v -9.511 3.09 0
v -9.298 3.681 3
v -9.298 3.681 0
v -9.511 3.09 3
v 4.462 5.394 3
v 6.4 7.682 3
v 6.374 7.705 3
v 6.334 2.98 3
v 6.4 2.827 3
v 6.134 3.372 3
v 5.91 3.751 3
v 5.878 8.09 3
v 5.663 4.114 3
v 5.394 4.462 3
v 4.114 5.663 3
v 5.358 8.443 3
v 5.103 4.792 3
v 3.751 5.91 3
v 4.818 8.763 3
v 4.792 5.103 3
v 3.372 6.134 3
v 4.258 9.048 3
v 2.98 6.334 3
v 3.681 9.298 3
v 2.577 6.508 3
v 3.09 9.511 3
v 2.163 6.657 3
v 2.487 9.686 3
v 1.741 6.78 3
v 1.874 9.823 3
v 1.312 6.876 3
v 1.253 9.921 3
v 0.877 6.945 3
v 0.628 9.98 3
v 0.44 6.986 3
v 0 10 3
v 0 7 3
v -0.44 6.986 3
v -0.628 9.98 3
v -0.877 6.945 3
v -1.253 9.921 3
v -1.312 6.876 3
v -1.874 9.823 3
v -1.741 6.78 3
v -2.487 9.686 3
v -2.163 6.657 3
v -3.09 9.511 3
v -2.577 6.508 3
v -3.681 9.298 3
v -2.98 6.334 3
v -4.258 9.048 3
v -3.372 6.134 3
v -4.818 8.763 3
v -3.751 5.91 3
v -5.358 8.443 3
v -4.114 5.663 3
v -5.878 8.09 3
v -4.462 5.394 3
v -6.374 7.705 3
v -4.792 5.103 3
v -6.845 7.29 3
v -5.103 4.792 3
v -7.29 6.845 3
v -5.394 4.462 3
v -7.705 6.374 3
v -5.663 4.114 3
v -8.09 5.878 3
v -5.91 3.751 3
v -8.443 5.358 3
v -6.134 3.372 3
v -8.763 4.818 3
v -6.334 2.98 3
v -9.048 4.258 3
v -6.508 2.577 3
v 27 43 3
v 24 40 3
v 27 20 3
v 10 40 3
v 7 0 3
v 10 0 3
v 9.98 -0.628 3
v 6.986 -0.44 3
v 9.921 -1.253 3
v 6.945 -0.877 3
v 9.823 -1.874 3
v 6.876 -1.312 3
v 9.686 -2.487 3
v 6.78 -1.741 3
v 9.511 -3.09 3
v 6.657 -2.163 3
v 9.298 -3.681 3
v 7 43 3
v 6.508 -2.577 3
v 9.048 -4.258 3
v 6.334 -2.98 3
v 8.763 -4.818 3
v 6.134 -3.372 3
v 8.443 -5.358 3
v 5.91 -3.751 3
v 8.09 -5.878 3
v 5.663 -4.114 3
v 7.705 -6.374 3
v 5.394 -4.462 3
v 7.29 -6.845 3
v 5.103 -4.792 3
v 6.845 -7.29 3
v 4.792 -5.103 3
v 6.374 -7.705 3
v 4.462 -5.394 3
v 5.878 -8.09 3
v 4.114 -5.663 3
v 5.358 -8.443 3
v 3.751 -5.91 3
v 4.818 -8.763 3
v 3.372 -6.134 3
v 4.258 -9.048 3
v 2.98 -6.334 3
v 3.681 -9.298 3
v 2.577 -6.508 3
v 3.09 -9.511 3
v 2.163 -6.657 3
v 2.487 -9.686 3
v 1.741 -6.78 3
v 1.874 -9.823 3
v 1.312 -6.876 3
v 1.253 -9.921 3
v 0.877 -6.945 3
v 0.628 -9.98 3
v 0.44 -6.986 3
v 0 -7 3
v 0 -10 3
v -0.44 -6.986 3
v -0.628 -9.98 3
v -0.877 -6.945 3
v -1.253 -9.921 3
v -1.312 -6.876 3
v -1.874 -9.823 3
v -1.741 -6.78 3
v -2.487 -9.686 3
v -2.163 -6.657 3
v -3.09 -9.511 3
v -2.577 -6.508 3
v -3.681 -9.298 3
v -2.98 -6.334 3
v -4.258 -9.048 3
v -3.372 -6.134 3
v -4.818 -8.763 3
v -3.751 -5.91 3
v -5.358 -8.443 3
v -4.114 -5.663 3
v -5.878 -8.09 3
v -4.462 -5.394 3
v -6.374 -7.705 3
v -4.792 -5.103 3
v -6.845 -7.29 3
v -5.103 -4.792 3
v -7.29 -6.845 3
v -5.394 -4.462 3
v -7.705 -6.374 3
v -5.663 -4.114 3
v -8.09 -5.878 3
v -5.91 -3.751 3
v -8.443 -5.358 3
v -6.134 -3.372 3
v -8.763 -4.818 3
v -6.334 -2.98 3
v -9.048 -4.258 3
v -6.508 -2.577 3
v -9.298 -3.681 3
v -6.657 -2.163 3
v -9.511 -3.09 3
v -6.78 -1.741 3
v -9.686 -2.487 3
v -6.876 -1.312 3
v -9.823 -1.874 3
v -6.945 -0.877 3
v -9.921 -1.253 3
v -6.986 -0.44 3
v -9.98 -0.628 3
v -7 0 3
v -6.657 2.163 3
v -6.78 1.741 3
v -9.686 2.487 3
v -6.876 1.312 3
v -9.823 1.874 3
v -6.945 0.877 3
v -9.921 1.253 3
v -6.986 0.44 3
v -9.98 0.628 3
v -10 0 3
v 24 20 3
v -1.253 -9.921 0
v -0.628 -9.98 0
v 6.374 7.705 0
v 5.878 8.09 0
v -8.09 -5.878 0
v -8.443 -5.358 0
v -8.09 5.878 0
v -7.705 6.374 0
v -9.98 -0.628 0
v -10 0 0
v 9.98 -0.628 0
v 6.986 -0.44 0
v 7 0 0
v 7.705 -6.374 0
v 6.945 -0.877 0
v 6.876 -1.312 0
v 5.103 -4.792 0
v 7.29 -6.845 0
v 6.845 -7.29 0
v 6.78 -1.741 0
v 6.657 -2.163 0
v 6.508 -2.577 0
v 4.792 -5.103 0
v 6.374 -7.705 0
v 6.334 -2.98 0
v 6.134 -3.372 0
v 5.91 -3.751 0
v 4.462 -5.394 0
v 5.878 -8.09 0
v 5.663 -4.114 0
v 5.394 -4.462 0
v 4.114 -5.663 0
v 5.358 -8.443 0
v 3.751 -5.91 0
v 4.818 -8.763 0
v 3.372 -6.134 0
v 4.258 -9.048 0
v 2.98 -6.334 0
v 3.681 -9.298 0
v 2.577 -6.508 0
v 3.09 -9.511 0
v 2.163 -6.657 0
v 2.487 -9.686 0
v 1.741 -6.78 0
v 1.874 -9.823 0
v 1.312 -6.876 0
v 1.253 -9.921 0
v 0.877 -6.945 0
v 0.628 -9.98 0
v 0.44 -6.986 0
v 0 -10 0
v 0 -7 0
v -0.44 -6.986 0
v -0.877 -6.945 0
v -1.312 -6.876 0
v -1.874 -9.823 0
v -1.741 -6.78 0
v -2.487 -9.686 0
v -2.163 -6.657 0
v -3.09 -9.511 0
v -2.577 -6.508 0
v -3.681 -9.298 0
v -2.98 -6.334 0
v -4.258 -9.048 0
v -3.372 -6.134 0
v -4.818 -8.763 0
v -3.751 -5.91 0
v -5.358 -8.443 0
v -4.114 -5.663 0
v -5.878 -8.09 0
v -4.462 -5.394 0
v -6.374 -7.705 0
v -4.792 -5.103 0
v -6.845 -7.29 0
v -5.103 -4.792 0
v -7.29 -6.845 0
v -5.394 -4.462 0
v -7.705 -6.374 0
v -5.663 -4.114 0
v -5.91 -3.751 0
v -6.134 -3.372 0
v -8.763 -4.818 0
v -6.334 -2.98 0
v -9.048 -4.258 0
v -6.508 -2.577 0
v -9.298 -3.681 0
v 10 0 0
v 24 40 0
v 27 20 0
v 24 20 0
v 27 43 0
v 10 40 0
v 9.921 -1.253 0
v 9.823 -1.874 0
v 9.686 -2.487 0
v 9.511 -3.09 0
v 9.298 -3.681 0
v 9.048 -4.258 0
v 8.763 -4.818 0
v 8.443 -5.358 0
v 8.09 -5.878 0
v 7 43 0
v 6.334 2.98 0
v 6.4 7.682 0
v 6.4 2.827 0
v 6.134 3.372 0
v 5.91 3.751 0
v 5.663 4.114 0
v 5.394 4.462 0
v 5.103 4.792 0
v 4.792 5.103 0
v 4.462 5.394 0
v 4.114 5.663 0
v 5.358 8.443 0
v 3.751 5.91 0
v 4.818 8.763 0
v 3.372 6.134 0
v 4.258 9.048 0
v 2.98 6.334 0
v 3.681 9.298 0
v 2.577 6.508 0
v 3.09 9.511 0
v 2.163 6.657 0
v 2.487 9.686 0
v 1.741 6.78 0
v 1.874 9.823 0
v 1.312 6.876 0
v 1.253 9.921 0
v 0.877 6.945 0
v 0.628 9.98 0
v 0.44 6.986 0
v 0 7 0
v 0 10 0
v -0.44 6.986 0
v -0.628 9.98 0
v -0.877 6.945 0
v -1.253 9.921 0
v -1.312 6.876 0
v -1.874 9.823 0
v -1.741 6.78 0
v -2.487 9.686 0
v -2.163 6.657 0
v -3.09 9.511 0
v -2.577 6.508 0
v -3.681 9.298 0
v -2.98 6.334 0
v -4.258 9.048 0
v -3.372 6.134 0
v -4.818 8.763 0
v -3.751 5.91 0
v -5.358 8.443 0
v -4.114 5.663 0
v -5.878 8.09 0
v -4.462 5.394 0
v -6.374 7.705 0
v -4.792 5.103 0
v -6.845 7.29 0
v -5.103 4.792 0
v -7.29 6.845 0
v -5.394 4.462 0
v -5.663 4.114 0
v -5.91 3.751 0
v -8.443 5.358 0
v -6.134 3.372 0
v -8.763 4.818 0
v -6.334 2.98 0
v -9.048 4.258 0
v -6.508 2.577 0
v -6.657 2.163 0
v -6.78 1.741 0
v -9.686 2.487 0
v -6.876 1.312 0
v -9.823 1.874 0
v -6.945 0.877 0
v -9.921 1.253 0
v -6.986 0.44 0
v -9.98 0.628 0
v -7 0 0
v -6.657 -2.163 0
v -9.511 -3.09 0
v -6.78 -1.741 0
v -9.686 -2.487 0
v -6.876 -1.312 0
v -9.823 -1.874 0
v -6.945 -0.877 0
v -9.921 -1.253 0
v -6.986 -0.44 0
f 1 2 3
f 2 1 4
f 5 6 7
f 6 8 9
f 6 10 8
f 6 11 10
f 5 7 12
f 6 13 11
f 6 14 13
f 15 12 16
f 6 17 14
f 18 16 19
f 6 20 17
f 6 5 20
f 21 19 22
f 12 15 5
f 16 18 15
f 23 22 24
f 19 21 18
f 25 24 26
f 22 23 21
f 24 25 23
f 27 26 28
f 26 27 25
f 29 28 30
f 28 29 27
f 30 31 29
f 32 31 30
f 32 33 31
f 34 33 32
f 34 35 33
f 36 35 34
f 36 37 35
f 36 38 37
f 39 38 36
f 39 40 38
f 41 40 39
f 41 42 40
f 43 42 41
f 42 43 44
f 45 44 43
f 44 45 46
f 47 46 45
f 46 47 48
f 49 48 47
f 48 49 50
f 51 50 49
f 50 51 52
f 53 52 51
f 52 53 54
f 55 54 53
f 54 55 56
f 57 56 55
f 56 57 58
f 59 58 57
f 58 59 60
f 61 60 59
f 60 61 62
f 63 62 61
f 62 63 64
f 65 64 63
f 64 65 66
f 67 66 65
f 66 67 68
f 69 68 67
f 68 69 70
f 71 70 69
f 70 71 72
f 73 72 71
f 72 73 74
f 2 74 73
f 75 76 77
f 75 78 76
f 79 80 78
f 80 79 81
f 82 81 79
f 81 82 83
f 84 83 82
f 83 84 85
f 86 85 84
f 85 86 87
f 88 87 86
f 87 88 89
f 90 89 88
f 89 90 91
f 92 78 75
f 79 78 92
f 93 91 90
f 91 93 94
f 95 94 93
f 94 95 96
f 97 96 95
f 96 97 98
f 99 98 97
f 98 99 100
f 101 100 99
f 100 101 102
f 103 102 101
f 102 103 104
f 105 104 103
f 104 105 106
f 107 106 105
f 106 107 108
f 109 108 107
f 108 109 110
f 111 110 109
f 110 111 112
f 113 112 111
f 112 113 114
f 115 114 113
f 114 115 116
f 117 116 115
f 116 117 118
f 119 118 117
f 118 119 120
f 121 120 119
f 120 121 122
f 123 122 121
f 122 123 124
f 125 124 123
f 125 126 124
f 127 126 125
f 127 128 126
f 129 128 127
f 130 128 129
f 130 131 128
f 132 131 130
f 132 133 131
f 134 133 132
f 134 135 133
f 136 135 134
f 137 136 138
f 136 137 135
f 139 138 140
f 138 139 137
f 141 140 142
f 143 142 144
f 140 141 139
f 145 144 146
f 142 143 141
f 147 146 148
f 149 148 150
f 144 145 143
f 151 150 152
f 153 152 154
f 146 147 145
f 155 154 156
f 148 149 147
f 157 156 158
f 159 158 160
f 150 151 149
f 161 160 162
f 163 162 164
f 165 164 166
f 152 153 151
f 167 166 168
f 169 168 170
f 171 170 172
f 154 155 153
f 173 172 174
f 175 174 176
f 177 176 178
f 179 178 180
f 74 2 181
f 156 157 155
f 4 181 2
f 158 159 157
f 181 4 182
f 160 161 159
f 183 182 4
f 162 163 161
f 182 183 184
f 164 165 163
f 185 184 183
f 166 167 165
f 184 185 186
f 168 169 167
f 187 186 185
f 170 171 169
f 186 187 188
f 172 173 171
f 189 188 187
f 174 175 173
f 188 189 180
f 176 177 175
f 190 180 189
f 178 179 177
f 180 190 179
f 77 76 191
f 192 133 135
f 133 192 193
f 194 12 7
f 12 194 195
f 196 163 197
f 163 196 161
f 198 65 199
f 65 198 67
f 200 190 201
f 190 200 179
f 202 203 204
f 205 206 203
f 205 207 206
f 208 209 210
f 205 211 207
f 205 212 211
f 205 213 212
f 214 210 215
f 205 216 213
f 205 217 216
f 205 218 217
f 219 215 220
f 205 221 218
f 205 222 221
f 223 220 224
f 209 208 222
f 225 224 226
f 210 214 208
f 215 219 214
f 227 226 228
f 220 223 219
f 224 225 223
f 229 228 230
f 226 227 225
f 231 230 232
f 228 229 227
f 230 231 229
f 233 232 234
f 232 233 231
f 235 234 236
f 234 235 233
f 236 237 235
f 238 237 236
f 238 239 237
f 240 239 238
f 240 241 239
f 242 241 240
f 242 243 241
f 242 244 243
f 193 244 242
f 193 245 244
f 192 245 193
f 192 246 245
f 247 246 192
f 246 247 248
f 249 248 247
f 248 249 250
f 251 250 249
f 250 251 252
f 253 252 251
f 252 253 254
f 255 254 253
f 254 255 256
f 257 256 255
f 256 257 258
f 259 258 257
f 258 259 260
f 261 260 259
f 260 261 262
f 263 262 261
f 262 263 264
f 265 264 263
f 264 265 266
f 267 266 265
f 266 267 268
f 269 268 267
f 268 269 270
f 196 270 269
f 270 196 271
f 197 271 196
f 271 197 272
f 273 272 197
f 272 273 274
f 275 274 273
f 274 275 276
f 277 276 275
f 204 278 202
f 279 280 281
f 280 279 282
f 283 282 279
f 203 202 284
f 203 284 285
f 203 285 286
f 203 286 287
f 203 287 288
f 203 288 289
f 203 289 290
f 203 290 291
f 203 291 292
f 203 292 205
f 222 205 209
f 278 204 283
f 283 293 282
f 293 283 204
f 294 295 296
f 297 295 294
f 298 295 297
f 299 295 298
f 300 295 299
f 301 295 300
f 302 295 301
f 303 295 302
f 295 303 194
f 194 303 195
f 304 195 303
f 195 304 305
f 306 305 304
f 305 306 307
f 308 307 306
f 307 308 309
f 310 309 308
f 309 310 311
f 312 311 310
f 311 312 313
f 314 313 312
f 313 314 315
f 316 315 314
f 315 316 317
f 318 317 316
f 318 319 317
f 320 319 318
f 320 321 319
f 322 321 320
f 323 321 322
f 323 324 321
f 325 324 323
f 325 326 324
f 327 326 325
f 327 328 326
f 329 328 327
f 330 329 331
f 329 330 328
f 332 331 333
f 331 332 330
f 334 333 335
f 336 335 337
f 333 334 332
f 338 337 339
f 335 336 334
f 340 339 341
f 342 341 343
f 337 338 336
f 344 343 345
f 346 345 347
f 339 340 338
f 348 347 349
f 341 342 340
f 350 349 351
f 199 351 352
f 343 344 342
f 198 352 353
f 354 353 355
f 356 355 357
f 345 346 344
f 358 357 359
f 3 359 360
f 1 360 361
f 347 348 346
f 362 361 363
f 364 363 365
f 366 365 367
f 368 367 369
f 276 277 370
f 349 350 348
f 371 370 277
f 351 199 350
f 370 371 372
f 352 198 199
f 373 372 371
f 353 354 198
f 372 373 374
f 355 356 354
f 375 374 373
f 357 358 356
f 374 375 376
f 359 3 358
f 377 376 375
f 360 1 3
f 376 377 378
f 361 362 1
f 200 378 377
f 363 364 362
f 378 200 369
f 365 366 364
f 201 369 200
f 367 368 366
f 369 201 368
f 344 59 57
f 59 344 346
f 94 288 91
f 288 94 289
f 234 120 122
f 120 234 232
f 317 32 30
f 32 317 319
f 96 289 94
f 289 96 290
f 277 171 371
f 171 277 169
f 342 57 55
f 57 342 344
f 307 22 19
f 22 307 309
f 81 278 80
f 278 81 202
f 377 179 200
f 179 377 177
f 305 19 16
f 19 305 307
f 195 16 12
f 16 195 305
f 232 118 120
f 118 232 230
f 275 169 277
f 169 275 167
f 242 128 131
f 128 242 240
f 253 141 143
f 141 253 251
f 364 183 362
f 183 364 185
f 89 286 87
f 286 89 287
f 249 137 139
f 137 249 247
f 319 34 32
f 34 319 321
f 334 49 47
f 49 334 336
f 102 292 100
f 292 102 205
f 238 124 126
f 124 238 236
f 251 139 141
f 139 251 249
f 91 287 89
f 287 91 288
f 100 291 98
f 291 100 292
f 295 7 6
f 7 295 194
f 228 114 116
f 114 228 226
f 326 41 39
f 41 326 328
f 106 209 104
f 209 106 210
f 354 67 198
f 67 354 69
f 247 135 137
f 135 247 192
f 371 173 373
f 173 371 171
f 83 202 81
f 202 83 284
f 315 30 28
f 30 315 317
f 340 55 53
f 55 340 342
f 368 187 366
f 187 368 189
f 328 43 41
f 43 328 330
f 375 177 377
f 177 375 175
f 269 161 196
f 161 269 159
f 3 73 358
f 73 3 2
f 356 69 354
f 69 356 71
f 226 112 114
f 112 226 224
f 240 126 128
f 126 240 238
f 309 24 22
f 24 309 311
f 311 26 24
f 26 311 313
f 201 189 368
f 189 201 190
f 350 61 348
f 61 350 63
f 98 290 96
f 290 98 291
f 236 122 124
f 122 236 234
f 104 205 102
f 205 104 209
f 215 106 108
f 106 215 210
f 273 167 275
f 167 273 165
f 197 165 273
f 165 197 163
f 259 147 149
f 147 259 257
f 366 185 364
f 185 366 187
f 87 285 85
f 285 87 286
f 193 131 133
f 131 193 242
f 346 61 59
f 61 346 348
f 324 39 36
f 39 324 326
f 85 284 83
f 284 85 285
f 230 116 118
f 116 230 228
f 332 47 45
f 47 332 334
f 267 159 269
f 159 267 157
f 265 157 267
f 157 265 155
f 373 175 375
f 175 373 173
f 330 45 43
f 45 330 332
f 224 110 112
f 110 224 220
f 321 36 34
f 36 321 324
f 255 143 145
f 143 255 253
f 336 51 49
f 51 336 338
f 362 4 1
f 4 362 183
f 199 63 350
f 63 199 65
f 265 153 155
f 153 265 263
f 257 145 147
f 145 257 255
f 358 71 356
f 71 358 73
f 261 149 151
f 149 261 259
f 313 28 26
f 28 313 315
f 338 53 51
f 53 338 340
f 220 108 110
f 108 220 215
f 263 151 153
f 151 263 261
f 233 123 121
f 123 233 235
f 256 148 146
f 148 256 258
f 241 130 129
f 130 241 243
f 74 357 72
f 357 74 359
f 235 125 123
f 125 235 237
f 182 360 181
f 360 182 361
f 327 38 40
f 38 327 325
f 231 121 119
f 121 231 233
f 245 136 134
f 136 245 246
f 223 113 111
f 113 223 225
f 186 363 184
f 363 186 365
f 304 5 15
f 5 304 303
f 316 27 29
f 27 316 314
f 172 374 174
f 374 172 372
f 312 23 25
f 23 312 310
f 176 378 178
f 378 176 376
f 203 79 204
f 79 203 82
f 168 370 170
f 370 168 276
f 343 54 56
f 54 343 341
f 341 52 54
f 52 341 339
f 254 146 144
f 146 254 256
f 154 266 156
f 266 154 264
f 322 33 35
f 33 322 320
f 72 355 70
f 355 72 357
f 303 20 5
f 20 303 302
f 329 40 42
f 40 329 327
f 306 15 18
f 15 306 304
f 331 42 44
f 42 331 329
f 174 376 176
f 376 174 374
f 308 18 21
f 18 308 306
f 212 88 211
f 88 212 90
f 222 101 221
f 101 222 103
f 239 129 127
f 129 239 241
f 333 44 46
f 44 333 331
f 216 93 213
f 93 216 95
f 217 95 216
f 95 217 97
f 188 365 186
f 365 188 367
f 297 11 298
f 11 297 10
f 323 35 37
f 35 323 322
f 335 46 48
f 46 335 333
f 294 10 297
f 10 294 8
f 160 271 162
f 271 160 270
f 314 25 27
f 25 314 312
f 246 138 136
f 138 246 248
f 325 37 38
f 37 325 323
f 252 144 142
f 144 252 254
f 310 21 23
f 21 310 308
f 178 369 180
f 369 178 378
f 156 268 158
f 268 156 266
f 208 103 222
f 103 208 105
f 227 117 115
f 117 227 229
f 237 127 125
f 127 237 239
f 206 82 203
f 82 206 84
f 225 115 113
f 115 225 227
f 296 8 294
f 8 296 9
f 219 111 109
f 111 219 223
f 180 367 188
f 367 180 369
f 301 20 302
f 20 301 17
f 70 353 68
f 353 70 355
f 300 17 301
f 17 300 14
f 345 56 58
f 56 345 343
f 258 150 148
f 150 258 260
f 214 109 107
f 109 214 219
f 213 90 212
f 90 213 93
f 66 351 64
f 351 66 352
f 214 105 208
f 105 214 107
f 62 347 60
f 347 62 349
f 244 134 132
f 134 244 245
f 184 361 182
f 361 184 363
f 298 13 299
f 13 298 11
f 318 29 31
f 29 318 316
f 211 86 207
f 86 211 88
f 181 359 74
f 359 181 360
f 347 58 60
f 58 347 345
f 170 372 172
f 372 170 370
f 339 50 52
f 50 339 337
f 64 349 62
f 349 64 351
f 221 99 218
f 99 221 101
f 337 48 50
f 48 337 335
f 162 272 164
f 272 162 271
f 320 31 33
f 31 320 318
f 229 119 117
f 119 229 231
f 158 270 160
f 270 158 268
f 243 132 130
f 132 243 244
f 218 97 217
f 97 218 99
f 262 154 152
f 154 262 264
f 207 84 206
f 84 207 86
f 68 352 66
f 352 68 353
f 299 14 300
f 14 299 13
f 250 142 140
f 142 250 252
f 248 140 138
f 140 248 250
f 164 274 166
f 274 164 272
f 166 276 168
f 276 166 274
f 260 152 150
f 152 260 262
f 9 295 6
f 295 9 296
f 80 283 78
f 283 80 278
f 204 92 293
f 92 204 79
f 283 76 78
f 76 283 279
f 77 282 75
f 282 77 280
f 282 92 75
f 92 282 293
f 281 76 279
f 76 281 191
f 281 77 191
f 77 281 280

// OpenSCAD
 /*
 * Actual glass name v.2
 * (c) 2020 David Mikulik
 * Licensed under 
 *   Creative Commons 
 *   Attribution Non Comercial Share alike license
 */
 

THIKNES = 3;

HOOK_DIAMETER = 20;

TEXTPAD_WIDTH = 34;
TEXTPAD_HEIGHT = 20;
TEXTPAD_NAME = "David";
TEXTPAD_IMAGE = "creeperhead.png";
//import(file = "160623.svg ", center = false, dpi = 96);
// 

NAME = 0;
IMAGE= 1;

 hook ();
 $fn=100;
 //translate ([30,0,0])   textPad ();
  
 module hook() {
     difference () {
        cylinder(d= HOOK_DIAMETER, h=THIKNES);
        cylinder(d= HOOK_DIAMETER-THIKNES*2, h=THIKNES);
        translate ([HOOK_DIAMETER/2-THIKNES*1.2,0,0])
            cube ([THIKNES/4, HOOK_DIAMETER/2, THIKNES]);
     }
     translate ([HOOK_DIAMETER/2-THIKNES,0,0])
        cube ([THIKNES, HOOK_DIAMETER*2, THIKNES]);
     translate ([HOOK_DIAMETER/2-THIKNES,HOOK_DIAMETER*2,0])
        cube ([HOOK_DIAMETER,THIKNES, THIKNES]);
     translate ([HOOK_DIAMETER*1.5-THIKNES*2,HOOK_DIAMETER,0])
        cube ([THIKNES, HOOK_DIAMETER, THIKNES]);
 }
 module textPad() {
    
    difference () 
     {
        cube ([TEXTPAD_WIDTH, TEXTPAD_HEIGHT, THIKNES*2]);
        translate ([TEXTPAD_WIDTH/2-THIKNES/2,0,THIKNES/2])
            cube ([THIKNES+.2, HOOK_DIAMETER+.4, THIKNES+.4]);
    }
    if (IMAGE)
        translate ([4,1,THIKNES*2.9])
        rotate ([0,0,0])
            scale([.09,.09,.03])
                surface(file=TEXTPAD_IMAGE,invert=true);
    translate ([2,TEXTPAD_HEIGHT/2-4,THIKNES*2]) {
        if (NAME)
            rotate ([0,0,0])
                linear_extrude(2) 
                    text(TEXTPAD_NAME, size = 8); 
    }   
 }
 
